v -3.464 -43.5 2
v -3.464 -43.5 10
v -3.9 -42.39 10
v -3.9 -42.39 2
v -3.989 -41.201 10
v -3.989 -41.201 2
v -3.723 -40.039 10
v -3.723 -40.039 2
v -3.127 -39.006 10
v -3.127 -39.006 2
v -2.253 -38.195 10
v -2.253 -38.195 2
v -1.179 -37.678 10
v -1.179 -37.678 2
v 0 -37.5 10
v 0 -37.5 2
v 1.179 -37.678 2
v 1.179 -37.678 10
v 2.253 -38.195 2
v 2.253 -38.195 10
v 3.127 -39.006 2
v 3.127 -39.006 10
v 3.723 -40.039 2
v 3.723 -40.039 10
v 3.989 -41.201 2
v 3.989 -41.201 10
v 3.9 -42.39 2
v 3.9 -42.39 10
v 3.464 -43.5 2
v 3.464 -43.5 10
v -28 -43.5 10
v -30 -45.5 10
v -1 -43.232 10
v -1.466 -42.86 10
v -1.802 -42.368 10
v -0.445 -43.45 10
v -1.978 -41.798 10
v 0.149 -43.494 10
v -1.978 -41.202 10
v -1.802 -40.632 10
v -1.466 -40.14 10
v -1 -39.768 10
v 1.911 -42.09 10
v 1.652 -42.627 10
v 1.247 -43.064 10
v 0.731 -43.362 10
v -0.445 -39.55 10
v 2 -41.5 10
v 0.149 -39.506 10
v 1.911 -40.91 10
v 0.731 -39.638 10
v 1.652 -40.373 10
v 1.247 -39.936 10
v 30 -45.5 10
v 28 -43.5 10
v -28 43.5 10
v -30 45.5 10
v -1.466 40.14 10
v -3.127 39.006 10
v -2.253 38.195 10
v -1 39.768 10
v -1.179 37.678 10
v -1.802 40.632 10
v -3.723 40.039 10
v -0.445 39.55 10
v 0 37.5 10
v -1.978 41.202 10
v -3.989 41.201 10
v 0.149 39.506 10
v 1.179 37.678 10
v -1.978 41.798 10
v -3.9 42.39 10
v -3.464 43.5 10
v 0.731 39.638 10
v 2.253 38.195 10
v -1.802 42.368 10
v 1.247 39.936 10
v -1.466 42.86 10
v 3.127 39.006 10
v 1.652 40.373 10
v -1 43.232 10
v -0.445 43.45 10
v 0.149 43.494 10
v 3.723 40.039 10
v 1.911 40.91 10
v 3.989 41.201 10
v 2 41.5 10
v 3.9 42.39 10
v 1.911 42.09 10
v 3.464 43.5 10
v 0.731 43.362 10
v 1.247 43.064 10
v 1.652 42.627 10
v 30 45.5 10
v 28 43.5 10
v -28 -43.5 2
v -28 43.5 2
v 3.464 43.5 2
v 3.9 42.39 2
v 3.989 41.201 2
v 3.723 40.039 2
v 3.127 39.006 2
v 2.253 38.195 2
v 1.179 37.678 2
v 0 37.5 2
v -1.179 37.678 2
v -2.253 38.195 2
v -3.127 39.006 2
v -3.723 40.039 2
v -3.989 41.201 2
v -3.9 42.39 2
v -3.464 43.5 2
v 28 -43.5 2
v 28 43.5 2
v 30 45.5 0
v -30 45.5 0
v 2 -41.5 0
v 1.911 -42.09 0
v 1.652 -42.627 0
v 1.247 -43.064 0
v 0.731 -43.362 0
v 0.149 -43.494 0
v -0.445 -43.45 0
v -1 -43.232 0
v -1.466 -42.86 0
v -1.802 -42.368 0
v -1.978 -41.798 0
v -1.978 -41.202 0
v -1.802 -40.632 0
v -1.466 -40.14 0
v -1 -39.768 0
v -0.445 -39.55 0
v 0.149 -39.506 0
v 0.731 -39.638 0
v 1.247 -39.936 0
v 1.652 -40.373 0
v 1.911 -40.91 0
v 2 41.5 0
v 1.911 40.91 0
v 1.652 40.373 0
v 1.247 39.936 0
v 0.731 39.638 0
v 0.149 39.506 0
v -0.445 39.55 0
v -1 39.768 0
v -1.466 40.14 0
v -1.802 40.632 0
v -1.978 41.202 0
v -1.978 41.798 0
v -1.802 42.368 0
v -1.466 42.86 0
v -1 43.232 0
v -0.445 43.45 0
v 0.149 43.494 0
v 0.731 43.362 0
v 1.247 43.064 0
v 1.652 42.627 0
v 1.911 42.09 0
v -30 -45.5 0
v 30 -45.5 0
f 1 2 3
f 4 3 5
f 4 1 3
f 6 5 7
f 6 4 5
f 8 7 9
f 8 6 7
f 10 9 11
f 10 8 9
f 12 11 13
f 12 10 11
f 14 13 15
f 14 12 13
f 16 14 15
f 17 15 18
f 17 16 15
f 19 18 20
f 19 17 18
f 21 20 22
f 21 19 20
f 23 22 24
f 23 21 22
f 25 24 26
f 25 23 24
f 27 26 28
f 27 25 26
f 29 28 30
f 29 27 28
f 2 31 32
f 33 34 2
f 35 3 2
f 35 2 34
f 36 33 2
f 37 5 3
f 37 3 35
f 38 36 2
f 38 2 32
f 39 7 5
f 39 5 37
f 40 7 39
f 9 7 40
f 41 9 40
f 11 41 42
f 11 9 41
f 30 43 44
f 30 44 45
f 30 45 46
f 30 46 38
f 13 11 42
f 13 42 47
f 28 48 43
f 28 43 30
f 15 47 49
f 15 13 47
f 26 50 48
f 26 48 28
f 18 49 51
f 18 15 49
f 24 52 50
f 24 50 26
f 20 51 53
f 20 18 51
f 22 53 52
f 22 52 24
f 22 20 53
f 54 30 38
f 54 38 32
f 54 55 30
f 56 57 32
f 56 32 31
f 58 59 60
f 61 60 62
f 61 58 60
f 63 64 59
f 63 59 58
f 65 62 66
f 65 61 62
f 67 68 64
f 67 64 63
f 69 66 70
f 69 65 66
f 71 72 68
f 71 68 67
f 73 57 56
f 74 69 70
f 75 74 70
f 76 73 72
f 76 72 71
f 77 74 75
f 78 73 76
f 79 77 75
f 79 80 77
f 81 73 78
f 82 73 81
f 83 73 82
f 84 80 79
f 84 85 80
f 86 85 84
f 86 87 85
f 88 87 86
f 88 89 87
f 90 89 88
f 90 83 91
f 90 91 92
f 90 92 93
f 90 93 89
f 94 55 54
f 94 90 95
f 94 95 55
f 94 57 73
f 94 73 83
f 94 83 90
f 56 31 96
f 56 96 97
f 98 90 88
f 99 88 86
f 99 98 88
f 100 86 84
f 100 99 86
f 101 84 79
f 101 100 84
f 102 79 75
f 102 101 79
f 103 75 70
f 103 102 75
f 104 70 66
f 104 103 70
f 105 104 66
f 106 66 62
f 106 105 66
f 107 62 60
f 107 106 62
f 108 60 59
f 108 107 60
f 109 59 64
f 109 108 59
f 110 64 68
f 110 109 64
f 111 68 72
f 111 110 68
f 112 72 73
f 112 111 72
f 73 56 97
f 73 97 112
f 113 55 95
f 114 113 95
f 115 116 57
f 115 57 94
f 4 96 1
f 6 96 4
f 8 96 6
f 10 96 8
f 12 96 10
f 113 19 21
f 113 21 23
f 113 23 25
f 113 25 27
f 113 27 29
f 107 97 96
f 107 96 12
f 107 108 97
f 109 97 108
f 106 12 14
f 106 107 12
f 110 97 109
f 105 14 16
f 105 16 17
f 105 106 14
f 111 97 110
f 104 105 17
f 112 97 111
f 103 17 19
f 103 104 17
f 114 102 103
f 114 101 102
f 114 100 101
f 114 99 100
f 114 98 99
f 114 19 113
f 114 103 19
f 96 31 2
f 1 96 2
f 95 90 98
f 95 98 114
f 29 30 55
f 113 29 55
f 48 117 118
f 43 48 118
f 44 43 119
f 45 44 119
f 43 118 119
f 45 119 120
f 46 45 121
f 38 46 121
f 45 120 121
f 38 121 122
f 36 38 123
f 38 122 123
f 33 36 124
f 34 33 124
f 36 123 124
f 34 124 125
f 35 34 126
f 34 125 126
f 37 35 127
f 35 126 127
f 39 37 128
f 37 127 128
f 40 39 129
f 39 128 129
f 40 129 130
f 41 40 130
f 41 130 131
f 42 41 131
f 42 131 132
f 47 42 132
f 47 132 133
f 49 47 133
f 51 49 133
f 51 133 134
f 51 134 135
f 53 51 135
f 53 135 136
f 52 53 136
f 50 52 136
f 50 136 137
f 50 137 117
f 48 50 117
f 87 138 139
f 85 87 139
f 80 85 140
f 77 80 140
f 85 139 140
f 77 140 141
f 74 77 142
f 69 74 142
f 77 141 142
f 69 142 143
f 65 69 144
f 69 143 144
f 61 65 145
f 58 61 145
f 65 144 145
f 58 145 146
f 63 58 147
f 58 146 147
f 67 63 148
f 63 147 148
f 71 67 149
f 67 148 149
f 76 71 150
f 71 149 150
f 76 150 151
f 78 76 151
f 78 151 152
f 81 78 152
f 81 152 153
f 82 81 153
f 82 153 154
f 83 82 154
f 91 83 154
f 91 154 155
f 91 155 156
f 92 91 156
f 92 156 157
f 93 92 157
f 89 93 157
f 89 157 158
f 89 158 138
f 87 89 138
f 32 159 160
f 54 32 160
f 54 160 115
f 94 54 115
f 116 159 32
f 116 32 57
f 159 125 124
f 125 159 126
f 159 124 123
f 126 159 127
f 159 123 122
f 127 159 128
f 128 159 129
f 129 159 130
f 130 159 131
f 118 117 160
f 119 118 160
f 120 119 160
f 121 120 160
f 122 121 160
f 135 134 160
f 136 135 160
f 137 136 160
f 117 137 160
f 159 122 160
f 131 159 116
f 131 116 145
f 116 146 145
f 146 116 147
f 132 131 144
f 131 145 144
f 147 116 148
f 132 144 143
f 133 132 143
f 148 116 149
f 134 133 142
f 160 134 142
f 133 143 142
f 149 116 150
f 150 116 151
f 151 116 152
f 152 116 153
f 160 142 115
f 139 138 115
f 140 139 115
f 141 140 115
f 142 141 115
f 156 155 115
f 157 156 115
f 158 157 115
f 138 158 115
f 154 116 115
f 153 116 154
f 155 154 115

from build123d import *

# Parameters (mm, degrees)
F2_W     = 60
F2_H     = 91
F3_DEPTH = 10
F4_W     = 56
F4_H     = 87
F5_DEPTH = 8
F6_R     = 4
F7_DEPTH = 10
F8_R     = 2
F9_DEPTH = 10.001


with BuildPart() as f3:
    # F2 (on Top) → F3 (new body)
    with BuildSketch(Plane.XY):
        Rectangle(F2_W, F2_H)
    extrude(amount=F3_DEPTH)

    # F4 (on face) → F5 (cut)
    with BuildSketch(Plane.XY.offset(10)):
        Rectangle(F4_W, F4_H)
    extrude(amount=-F5_DEPTH, mode=Mode.SUBTRACT)

    # F6 (on face) → F7 (join)
    with BuildSketch(Plane(origin=(0, 0, 0), x_dir=(1, 0, 0), z_dir=(0, 0, -1))):
        with Locations((0, -41.5)):
            Circle(F6_R)
        with Locations((0, 41.5)):
            Circle(F6_R)
    extrude(amount=-F7_DEPTH)

    # F8 (on face) → F9 (cut, through all)
    with BuildSketch(Plane(origin=(0, 0, 0), x_dir=(1, 0, 0), z_dir=(0, 0, -1))):
        with Locations((0, -41.5)):
            Circle(F8_R)
        with Locations((0, 41.5)):
            Circle(F8_R)
    extrude(amount=-F9_DEPTH, mode=Mode.SUBTRACT)


solid = f3.part
